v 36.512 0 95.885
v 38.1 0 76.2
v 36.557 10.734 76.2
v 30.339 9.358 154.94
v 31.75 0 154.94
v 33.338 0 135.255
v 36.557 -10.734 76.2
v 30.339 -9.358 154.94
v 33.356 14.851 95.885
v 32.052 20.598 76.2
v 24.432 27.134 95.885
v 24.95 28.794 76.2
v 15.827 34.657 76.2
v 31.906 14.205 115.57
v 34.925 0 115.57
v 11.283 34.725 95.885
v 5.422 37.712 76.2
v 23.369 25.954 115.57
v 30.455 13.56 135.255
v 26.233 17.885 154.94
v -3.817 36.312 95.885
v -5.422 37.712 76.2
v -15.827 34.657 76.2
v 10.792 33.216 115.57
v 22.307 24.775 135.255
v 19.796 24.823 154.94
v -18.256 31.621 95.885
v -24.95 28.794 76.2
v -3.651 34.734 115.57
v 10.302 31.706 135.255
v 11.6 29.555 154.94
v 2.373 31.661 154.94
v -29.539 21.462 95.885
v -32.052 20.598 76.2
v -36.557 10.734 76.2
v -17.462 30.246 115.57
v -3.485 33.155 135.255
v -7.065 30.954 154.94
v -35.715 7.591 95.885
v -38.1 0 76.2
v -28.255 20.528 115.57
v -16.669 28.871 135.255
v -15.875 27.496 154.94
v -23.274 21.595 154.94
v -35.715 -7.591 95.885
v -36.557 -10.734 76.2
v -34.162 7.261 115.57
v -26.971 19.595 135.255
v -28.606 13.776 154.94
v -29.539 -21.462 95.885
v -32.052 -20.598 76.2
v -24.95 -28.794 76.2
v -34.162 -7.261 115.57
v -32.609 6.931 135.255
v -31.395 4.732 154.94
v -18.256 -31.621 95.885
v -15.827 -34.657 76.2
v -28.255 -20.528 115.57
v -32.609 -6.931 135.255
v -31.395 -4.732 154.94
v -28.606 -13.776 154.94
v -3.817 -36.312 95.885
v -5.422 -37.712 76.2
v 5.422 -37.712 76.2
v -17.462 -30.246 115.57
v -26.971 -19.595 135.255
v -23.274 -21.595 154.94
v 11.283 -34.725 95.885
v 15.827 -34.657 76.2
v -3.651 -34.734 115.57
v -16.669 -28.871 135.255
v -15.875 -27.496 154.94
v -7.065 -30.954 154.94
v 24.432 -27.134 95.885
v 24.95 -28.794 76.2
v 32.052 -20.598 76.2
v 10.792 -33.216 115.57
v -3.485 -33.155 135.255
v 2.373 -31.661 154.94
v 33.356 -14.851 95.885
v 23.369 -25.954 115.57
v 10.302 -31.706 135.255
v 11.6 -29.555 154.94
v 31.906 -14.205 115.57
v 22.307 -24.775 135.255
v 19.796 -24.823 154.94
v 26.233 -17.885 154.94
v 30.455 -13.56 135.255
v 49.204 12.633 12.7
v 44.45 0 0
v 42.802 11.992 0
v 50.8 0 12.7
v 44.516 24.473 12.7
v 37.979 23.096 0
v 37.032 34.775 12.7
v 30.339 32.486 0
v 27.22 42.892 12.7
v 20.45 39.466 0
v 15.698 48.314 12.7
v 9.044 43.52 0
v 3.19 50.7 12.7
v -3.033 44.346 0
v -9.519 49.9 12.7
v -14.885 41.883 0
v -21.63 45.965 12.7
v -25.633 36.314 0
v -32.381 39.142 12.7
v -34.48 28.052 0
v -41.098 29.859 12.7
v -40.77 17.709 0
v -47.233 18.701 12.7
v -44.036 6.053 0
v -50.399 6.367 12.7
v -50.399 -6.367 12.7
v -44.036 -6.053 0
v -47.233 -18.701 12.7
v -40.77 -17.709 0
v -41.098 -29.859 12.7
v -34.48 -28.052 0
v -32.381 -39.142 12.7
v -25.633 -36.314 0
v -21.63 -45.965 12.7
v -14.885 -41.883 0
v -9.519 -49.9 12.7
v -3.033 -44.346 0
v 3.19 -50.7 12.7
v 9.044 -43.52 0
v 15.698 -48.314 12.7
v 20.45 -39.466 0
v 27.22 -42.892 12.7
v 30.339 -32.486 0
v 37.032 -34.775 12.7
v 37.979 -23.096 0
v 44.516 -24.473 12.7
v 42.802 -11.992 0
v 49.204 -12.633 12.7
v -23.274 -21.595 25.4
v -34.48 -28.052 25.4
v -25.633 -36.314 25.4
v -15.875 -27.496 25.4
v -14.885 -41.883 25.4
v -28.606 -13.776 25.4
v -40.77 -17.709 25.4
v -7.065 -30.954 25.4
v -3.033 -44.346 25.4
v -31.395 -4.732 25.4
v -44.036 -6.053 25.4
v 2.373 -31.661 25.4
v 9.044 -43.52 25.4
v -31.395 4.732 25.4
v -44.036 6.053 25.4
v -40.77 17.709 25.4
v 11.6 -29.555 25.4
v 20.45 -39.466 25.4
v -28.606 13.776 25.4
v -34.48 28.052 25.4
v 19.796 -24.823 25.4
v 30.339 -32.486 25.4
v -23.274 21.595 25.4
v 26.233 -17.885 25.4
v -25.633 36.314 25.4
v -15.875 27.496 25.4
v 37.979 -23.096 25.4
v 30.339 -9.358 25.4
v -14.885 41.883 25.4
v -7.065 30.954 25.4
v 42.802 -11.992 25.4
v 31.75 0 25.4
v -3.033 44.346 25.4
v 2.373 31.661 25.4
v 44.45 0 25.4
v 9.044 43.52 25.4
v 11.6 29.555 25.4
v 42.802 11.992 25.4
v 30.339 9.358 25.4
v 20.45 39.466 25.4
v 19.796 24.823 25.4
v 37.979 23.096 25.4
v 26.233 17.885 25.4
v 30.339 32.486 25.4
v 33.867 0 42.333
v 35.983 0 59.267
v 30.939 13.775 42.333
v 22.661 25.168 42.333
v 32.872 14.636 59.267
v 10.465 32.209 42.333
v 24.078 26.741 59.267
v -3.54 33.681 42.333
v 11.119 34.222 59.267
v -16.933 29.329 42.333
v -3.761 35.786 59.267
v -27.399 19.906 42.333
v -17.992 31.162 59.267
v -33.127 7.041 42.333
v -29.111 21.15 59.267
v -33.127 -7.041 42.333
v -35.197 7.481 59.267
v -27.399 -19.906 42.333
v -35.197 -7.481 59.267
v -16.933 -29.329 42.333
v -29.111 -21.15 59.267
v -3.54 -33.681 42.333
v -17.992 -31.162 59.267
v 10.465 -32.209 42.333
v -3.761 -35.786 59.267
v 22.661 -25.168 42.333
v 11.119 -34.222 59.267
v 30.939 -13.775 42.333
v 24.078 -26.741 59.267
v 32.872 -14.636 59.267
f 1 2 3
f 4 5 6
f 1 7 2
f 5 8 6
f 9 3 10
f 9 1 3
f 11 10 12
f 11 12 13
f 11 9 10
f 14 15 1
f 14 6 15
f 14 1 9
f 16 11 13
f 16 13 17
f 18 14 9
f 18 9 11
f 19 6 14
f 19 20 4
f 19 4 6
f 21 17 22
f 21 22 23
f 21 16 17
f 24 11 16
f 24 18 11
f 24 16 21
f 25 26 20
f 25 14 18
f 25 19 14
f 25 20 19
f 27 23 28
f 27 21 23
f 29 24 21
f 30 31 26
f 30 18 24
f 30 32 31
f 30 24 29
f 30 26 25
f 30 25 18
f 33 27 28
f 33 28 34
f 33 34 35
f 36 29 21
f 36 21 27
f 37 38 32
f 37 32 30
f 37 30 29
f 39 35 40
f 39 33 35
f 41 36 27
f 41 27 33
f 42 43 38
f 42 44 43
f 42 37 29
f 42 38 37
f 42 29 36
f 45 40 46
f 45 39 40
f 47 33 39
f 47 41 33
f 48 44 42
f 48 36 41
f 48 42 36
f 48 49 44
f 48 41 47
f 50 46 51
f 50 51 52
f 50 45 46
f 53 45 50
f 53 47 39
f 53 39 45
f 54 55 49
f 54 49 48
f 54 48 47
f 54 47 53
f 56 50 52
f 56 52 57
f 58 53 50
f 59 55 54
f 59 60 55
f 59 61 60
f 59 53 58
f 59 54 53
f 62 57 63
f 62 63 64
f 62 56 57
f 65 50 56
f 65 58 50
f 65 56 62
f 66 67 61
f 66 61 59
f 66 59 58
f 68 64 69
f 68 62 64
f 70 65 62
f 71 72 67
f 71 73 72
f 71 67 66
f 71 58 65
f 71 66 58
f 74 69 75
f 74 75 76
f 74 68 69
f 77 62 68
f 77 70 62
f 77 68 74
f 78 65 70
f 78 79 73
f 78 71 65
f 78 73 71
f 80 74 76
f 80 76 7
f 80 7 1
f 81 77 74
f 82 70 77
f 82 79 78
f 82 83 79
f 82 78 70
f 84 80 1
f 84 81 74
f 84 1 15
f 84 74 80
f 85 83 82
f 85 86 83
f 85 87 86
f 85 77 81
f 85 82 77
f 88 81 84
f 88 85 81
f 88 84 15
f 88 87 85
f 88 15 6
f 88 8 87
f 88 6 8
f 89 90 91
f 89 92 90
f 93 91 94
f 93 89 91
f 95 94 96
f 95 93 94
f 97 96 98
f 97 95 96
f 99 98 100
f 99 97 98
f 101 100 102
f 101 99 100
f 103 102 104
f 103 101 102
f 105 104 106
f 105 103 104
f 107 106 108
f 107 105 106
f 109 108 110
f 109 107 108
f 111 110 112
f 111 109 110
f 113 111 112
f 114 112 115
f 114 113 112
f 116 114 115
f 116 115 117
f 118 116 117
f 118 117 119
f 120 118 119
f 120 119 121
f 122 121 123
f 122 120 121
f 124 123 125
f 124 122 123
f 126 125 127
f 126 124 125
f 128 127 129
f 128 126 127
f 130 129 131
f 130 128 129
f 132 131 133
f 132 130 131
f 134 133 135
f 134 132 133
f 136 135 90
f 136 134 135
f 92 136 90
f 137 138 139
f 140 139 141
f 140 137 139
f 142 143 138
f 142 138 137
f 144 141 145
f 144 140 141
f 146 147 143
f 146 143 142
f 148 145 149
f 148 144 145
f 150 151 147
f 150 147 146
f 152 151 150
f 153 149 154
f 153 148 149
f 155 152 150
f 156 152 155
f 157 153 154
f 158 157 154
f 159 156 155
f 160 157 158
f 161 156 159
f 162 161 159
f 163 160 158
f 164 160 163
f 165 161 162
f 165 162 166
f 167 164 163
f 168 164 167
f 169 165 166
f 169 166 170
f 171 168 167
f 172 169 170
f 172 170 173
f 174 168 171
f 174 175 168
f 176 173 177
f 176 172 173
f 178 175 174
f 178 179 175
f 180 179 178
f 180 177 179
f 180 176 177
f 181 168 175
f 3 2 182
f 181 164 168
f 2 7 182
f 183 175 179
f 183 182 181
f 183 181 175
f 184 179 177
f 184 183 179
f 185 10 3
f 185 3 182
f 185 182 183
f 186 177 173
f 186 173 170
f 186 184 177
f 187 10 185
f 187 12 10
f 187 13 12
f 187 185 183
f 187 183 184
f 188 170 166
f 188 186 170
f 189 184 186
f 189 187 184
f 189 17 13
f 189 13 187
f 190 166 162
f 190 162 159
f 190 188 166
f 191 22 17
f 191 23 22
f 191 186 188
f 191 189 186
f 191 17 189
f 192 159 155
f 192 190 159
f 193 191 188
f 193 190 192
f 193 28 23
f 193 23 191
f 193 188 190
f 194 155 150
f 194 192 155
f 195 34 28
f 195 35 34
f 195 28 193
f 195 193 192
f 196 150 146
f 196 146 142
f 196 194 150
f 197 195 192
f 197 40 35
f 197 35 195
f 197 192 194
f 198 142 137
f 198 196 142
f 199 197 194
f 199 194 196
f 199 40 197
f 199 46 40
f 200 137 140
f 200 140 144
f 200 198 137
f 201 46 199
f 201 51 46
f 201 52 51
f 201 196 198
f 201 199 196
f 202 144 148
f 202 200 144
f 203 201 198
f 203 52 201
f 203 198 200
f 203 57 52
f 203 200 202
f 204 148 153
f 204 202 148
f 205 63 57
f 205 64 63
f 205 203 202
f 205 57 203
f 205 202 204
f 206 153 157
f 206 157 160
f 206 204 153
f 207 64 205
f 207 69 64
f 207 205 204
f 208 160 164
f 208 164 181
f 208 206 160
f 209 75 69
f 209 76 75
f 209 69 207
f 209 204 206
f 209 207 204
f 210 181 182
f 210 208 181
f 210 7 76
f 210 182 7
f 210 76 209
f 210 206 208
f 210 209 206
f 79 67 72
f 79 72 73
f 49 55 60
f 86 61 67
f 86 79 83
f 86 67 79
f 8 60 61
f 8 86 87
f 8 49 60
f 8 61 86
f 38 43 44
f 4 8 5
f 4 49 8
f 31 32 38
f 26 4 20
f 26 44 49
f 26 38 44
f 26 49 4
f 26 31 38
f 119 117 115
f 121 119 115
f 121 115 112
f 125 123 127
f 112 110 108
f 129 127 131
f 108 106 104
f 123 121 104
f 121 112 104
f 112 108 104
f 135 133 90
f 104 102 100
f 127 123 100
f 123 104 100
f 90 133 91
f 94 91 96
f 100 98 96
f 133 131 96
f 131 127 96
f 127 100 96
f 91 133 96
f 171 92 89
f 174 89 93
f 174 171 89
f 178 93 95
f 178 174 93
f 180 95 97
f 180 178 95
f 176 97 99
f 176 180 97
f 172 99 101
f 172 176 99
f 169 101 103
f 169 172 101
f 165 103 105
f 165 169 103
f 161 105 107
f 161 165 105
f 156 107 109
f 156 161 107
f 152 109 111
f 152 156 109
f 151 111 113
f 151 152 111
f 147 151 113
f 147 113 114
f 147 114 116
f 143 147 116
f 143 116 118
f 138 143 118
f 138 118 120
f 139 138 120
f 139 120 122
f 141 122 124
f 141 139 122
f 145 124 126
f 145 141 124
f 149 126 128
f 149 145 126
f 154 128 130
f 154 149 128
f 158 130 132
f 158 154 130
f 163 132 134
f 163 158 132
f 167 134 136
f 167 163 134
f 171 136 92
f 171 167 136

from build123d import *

# Parameters (mm, degrees)
F0_R       = 44.45
F2_R       = 50.8
F3_FACE_R  = 50.8
F5_R       = 44.45
F7_R       = 31.75
F9_R       = 38.1
F10_FACE_R = 38.1
F12_R      = 31.75


with BuildPart() as f3:
    # F0 (on Top) → F3 section 0
    with BuildSketch(Plane.XY):
        Circle(F0_R)
    # F2 (on offset) → F3 section 1
    with BuildSketch(Plane.XY.offset(12.7)):
        Circle(F2_R)
    loft()

    # F3_face (on face) → F6 section 0
    with BuildSketch(Plane.XY.offset(12.7)):
        Circle(F3_FACE_R)
    # F5 (on offset) → F6 section 1
    with BuildSketch(Plane.XY.offset(25.4)):
        Circle(F5_R)
    loft()

    # F7 (on offset) → F10 section 0
    with BuildSketch(Plane.XY.offset(25.4)):
        Circle(F7_R)
    # F9 (on offset) → F10 section 1
    with BuildSketch(Plane.XY.offset(76.2)):
        Circle(F9_R)
    loft()

    # F10_face (on face) → F13 section 0
    with BuildSketch(Plane.XY.offset(76.2)):
        Circle(F10_FACE_R)
    # F12 (on offset) → F13 section 1
    with BuildSketch(Plane.XY.offset(154.94)):
        Circle(F12_R)
    loft()


solid = f3.part
